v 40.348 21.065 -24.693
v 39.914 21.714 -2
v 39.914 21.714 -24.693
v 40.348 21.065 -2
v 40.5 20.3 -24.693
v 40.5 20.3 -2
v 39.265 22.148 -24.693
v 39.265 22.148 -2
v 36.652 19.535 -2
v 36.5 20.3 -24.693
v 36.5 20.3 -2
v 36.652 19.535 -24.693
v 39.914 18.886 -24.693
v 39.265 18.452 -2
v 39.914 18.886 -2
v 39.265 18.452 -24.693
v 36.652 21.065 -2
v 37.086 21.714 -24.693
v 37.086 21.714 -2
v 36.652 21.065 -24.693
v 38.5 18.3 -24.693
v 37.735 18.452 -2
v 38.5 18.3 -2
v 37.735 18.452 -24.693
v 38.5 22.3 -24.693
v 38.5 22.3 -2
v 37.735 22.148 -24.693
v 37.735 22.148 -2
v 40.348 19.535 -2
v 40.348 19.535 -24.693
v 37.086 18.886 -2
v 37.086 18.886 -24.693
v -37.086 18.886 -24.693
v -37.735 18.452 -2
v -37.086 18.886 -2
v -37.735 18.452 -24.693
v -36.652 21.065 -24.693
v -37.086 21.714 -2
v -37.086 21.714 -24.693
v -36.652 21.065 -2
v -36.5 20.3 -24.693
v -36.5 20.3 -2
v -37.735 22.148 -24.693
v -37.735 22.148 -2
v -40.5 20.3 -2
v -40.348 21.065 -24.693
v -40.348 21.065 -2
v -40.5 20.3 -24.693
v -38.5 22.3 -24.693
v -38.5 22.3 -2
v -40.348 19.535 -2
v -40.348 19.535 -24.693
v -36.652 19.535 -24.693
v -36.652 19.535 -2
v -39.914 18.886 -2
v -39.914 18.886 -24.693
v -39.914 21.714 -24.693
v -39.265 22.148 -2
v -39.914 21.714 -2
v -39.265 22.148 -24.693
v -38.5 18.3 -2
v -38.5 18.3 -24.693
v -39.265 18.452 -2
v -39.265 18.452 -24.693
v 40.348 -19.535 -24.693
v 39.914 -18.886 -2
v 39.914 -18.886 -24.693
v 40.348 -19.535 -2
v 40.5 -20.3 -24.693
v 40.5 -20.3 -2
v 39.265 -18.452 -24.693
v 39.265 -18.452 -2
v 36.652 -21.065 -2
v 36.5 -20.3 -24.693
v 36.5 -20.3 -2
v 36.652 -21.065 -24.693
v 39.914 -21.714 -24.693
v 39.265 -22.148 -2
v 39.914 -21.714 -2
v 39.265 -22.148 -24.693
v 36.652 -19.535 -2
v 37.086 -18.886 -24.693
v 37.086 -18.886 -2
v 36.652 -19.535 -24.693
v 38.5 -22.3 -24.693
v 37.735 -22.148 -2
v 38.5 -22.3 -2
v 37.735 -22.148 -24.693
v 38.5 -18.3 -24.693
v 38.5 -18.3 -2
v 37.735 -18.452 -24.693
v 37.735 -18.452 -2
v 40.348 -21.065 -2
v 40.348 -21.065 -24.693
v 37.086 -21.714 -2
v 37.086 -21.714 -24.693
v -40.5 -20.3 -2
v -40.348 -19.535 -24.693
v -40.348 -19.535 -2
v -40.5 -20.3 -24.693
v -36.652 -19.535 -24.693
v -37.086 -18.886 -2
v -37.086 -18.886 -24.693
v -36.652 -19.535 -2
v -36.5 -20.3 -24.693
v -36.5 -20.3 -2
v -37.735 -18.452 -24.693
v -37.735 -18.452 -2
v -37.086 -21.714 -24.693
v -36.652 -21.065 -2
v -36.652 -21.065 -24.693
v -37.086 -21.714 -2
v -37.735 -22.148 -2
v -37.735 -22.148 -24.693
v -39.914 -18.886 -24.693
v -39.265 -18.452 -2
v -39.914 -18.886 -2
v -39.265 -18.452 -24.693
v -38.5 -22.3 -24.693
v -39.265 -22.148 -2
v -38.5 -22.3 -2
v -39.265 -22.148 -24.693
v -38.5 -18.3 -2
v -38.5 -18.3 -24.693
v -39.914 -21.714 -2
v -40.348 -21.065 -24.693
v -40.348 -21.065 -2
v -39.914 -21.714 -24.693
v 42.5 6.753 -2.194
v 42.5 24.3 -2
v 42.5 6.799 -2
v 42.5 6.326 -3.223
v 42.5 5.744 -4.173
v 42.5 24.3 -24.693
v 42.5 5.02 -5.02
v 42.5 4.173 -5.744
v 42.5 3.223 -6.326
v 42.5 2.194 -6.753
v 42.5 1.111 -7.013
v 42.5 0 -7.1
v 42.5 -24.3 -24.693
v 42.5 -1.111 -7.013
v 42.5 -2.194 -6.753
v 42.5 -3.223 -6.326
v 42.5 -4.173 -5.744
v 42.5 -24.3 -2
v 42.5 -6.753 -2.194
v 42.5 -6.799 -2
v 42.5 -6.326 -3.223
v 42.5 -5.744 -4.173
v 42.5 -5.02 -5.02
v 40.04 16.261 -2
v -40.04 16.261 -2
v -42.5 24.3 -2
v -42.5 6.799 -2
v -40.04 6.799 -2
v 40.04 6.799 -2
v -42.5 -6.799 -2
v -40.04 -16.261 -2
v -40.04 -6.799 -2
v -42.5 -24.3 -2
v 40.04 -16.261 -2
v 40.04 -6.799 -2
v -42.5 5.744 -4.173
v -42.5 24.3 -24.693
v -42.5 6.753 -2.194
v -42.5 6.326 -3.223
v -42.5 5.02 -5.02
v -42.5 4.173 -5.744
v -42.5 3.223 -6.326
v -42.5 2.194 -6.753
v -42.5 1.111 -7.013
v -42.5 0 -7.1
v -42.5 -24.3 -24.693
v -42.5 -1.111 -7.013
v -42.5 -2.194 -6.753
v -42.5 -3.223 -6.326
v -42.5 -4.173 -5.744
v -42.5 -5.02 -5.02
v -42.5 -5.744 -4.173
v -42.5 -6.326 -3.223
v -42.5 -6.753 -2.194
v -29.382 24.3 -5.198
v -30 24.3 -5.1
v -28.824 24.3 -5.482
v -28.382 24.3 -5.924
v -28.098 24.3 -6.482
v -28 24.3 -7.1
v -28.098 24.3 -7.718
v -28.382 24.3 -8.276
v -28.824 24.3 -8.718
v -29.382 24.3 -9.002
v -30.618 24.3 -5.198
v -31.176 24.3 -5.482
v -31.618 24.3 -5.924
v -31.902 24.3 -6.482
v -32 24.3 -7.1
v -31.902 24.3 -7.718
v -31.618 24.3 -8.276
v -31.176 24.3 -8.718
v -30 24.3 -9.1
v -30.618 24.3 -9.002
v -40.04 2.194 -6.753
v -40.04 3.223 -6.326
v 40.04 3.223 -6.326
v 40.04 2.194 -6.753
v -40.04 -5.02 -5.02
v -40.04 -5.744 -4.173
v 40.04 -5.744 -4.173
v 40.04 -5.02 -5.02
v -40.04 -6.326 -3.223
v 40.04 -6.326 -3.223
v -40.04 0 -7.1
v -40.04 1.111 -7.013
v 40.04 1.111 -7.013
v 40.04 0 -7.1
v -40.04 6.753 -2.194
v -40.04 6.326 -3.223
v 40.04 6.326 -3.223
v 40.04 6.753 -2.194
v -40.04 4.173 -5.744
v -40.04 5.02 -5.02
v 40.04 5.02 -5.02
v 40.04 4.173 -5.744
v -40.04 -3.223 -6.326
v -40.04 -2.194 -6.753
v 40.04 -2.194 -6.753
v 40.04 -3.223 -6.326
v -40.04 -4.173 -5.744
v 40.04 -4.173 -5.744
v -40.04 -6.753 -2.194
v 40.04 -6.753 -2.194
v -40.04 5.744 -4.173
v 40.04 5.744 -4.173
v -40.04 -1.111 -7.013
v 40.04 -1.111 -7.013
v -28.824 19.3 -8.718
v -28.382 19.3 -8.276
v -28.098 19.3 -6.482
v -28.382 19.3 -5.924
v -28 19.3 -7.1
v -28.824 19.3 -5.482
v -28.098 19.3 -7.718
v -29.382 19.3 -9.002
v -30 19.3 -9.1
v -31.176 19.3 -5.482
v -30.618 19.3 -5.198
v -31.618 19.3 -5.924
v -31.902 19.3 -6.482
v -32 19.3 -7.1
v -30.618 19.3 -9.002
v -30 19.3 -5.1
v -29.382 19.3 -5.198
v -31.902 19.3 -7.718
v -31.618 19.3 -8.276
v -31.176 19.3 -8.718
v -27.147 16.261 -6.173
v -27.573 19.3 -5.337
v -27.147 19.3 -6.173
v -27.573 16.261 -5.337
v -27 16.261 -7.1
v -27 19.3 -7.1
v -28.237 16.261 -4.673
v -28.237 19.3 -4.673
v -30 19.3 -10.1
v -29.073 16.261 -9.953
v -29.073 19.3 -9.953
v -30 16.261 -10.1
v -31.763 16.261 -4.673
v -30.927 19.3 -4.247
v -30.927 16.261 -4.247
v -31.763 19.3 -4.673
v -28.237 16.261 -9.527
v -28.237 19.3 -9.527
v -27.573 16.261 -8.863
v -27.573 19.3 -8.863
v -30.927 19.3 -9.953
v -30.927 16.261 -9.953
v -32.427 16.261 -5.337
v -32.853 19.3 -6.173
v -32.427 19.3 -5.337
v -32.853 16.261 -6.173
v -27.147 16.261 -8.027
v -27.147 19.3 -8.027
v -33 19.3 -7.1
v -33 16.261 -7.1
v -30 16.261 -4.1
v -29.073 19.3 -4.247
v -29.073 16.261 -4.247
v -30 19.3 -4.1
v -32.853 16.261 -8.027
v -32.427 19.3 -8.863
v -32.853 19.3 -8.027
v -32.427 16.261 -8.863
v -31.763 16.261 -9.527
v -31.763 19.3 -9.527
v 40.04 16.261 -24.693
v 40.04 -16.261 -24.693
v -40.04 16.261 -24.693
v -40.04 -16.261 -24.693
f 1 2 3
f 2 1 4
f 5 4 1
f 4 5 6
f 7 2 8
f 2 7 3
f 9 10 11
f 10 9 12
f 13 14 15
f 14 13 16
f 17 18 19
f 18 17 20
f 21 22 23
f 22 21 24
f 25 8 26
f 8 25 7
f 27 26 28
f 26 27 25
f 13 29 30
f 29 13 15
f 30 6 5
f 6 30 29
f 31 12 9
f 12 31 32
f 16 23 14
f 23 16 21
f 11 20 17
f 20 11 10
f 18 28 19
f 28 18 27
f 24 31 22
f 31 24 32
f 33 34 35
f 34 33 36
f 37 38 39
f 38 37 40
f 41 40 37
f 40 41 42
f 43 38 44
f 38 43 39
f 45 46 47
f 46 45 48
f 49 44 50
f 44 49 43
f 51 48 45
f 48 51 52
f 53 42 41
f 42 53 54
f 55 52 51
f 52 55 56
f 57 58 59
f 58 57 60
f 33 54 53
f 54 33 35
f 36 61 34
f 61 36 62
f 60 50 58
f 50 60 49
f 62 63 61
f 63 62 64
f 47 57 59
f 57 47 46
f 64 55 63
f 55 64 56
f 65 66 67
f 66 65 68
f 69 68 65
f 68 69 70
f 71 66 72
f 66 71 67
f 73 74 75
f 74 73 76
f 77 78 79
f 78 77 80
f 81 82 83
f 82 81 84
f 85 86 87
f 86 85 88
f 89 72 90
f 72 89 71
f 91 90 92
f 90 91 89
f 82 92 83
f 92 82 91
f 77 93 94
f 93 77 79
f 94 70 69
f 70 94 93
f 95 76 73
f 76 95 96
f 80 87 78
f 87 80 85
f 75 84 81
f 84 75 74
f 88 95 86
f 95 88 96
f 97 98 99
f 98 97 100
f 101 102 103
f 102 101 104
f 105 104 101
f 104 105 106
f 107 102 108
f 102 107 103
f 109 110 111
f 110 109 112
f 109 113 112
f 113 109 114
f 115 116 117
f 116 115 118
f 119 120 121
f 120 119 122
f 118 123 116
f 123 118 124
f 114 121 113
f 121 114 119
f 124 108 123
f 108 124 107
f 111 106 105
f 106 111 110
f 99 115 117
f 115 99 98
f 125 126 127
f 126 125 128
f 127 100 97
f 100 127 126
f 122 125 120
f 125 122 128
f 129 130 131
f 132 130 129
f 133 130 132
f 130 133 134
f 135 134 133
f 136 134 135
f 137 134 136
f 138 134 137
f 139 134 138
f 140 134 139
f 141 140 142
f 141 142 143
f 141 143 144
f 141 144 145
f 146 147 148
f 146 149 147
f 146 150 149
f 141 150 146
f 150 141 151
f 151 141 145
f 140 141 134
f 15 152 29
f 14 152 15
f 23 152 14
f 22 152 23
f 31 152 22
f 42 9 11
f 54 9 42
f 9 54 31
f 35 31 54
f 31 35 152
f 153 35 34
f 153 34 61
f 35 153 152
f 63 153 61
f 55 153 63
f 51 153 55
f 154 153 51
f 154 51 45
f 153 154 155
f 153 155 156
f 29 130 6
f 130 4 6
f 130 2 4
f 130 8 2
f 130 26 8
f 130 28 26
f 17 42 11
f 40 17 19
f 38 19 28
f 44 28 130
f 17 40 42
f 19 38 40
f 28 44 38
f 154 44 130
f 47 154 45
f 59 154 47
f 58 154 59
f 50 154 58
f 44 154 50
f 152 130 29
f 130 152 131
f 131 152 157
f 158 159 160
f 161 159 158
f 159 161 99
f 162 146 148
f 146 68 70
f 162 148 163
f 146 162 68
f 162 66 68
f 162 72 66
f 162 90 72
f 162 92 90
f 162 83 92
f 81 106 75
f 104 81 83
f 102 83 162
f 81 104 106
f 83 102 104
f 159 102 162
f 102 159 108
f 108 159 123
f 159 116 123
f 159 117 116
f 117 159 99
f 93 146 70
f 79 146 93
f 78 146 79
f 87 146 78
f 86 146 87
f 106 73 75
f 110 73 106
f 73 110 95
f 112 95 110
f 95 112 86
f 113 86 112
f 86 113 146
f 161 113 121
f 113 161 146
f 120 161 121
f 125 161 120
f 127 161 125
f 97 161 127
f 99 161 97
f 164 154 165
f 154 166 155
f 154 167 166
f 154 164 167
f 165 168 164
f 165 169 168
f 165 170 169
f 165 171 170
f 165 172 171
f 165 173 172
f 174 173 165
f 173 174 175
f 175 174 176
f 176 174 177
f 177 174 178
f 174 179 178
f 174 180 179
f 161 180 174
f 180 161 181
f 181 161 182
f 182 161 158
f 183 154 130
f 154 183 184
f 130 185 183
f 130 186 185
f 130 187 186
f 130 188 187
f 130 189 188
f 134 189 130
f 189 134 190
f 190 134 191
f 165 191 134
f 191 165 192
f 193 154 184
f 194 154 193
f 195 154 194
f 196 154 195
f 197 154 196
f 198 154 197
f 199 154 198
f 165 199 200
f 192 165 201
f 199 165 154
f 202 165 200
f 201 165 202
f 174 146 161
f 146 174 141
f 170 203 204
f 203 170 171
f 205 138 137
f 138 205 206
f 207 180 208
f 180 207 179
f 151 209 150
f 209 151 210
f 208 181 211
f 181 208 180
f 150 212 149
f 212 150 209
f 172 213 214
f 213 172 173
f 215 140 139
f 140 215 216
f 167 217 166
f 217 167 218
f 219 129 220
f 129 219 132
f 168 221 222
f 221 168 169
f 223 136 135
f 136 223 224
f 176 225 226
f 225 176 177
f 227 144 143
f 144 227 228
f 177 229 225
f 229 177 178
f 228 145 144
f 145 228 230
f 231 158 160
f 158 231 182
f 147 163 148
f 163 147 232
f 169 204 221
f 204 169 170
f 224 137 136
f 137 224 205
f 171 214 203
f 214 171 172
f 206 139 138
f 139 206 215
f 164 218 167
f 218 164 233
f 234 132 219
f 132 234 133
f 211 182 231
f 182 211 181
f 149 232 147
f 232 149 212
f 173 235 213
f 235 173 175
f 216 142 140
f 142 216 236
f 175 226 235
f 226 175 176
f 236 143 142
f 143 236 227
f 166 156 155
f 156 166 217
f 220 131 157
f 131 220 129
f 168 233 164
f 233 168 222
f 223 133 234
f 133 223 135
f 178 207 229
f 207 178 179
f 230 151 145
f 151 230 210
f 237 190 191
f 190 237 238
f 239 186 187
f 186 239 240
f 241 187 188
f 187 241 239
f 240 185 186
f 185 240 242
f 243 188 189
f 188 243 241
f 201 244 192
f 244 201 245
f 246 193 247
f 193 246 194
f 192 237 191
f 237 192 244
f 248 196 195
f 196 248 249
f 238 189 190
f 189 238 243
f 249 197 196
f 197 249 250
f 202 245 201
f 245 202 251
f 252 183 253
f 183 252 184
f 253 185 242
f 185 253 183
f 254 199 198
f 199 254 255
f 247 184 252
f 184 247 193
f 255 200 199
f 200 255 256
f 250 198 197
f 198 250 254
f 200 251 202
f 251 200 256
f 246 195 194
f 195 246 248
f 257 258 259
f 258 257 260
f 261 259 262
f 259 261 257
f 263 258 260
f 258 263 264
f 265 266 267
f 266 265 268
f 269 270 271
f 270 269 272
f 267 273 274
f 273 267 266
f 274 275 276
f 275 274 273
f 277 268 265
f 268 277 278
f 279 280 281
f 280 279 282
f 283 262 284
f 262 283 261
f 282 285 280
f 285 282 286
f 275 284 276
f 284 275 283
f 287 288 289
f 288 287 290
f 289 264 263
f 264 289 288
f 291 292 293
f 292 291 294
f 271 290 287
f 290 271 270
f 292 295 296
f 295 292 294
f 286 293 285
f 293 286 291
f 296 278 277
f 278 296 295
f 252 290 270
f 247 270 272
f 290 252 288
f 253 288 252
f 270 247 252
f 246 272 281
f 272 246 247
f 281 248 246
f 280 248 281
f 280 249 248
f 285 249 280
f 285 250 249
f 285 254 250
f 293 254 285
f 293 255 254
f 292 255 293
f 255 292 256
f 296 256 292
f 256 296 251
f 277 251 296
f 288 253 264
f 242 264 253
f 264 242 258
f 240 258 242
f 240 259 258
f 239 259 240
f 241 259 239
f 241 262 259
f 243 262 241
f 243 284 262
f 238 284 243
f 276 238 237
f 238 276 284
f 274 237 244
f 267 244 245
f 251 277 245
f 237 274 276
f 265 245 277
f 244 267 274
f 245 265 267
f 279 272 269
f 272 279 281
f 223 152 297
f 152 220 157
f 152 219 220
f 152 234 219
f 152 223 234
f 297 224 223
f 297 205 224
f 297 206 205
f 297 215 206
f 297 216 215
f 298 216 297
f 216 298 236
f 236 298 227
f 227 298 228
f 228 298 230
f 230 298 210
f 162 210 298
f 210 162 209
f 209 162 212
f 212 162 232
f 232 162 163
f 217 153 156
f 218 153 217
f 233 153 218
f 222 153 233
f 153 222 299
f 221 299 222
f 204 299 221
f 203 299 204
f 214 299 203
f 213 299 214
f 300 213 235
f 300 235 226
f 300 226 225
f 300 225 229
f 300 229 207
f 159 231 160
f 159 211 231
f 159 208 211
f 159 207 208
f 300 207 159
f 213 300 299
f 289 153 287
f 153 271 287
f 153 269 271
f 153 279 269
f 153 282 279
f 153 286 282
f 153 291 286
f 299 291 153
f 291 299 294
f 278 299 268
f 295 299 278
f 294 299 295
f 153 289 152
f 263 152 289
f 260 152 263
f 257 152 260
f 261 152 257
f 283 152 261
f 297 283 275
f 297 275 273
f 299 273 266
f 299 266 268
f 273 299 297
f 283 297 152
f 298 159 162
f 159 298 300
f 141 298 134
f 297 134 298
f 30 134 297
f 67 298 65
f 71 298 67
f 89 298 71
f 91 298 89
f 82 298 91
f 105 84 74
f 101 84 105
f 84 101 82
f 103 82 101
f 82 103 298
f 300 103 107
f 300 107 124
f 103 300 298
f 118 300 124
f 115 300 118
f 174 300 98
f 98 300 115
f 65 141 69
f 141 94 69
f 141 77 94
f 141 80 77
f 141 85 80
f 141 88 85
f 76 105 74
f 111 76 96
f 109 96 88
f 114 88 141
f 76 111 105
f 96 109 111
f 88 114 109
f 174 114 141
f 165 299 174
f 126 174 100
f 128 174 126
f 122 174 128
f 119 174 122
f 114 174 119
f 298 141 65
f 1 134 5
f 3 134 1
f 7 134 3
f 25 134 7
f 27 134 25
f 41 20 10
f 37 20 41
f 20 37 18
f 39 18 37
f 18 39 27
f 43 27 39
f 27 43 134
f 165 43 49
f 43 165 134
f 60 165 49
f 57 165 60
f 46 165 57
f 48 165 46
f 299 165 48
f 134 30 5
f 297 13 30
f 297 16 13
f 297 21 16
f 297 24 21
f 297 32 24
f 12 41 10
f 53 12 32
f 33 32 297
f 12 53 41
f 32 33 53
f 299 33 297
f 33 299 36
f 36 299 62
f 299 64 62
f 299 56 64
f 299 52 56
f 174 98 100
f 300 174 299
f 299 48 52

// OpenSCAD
// file: bolt.scad
include <variables.scad>

bolt();

module bolt() {
	color("Silver")
	union() {
		for (i = [0:2]) {
			rotate([0, 0, 180/3*i])
			cube([boltWidth, boltSegmentWidth, boltHeight],center=true);
		}
	}
}
// file: box.scad
include <variables.scad>
use <bolt.scad>

CylinderPunchedBox(MaxLength, MinWidth, stickRadius-boxSpacing/2+batteryRadius*2+minEdgeWidth, holeRadius, holeRadius*2, true);

module HoledBox(length, width, height, holeRadius, holePadding, NutIndents) {
	difference() {
		cube([length, width, height], center = true);
		
		scale([1,1,1.001])
		union() { // subtractions
			// holes
			translate([
				 (length-holePadding-holeRadius*2)/2, 
				 (width-holePadding-holeRadius*2)/2, 
				-(height)/2])
			cylinder(height+.1, r=holeRadius, $fn=16);
			translate([
				-(length-holePadding-holeRadius*2)/2, 
				 (width-holePadding-holeRadius*2)/2, 
				-(height)/2])
			cylinder(height+.1, r=holeRadius, $fn=16);
			translate([
				 (length-holePadding-holeRadius*2)/2, 
				-(width-holePadding-holeRadius*2)/2, 
				-(height)/2])
			cylinder(height+.1, r=holeRadius, $fn=16);
			translate([
				-(length-holePadding-holeRadius*2)/2, 
				-(width-holePadding-holeRadius*2)/2, 
				-(height)/2])
			cylinder(height+.1, r=holeRadius, $fn=16);
		}

		if(NutIndents) {
			translate([0, 0, -(height-boltHeight+0.001)/2]) {
				translate([(length-holePadding-holeRadius*2)/2, (width-holePadding-holeRadius*2)/2, ])
				scale([1.05, 1.05, 1.1])
				bolt();
				translate([(length-holePadding-holeRadius*2)/2, -(width-holePadding-holeRadius*2)/2, ])
				scale([1.05, 1.05, 1.1])
				bolt();
				translate([-(length-holePadding-holeRadius*2)/2, (width-holePadding-holeRadius*2)/2, ])
				scale([1.05, 1.05, 1.1])
				bolt();
				translate([-(length-holePadding-holeRadius*2)/2, -(width-holePadding-holeRadius*2)/2, ])
				scale([1.05, 1.05, 1.1])
				bolt();
			}
		}
	}
}

module CylinderPunchedBox(length, width, height, holeRadius, holePadding, NutIndents) {
	difference() {
		translate([0, 0, -(height+boxSpacing)/2])
		HoledBox(length, width, height, holeRadius, holePadding, NutIndents);

		scale([1.001, 1, 1])
		rotate([0, 90, 0])
		cylinder((length), r=stickRadius, center=true, $fn=40);
	}
}
// file: pcb.scad
include <variables.scad>

PCB();

module PCB() {
	pinheaderHeight = PCBBoardToBoardHeight-2*PCBHeight;
	pinheaderLength = 38;
	pinheaderWidth = 2.4;
  color(alpha=0.5)
	translate([-(PCBLength-PCBBoardLength), 0, -(PCBBoardToBoardHeight)]) {
		color("Orange")
		translate([(PCBLength-PCBBoardLength)/2, 0, PCBHeight/2])
		cube([PCBBoardLength, PCBWidth, PCBHeight], center=true);
		
		translate([0, 0, PCBHeight]) {
			color("Grey") {
				translate([0, (PCBWidth-pinheaderWidth)/2-PCBNotchWidth, pinheaderHeight/2])
				cube([pinheaderLength, pinheaderWidth, pinheaderHeight], center=true);
				translate([0, -(PCBWidth-pinheaderWidth)/2+PCBNotchWidth, pinheaderHeight/2])
				cube([pinheaderLength, pinheaderWidth, pinheaderHeight], center=true);
			}
			color("Black")
			translate([0, 0, pinheaderHeight+PCBHeight/2])
			cube([55, 32.5, PCBHeight], center=true);

			color("Blue")
			translate([-PCBSensorBoardOverhang, PCBSensorBoardYOffset, 0])
			translate([PCBLength/2, 0, 0])
			translate([PCBSensorBoardLength/2, 0, pinheaderHeight+PCBHeight/2])
			difference() {
				cube([PCBSensorBoardLength, PCBSensorBoardWidth, PCBHeight], center=true);
				translate([PCBSensorBoardLength/2-1-PCBSensorBoardHoleRadius,  (PCBSensorBoardHoleCenterYDistance/2), 0])
				cylinder(10, r=PCBSensorBoardHoleRadius, center=true, $fn=20);
				translate([PCBSensorBoardLength/2-1-PCBSensorBoardHoleRadius, -(PCBSensorBoardHoleCenterYDistance/2), 0])
				cylinder(10, r=PCBSensorBoardHoleRadius, center=true, $fn=20);
			}
			
			color("Grey")
			translate([34, 0, pinheaderHeight/2])
			cube([pinheaderWidth, 20, pinheaderHeight], center=true);
		}
	}
}
// file: pcbBox.scad
include <variables.scad>
use <pcb.scad>
use <box.scad>

pcbBox();

module pcbBox() {
	difference() {
		CylinderPunchedBox(MaxLength, MinWidth, MinHeight, holeRadius, holeRadius*2);
		
		// Hollow out inside box space
		CutoutHeight = stickRadius+(PCBBoardToBoardHeight+PCBComponentsHeight)+PCBToBottomSpacing+PCBToTopSpacing;
		scale([1.001, 1.01, 1])
		translate([0, 0, -(CutoutHeight)/2])
		cube([PCBLength, PCBWidth-PCBNotchWidth*2, CutoutHeight], center=true);
		
		// PCB Notches cutout
		translate([-PCBNotchWidth, 0, -(stickRadius+PCBToTopSpacing+PCBComponentsHeight)])
		PCB();		

		// LED hole
		ledSmallRadius = 2;
		ledLargeRadius = 3;
		ledSmallHoleLength = 5;
		ledLargeHoleLength = ((MinWidth-(PCBWidth-PCBNotchWidth*2))/2)-ledSmallHoleLength;
		color("Green")
		translate([-PCBBoardLength/2+5, MinWidth/2, -(stickRadius)])
		rotate([90, 0, 0]){
			scale([1, 1, 1.01])
			translate([0, 0, -0.01])
			cylinder(ledSmallHoleLength, r=ledSmallRadius, center=false, $fn=20);
			translate([0, 0, ledSmallHoleLength])
			cylinder(ledLargeHoleLength, r=ledLargeRadius, center=false, $fn=20);
		}
	}
}
// file: variables.scad
innerWidth = 38;
innerLength = 80;
innerHeight = 25;
minEdgeWidth = 2.5;
largeEdgeWidth = 6;
holeRadius = 2;
boxSpacing = 4;
stickRadius = 7.1; // fixed by table

sensorScrewHoleRadius = 2.5/2;

// PCBVariables
	PCBWidth = 35.2;
	PCBBoardLength = 70;
	PCBLength = 80;// 70;
	PCBHeight = 1.5;
	PCBBoardToBoardHeight = 13.9; // height of the two layers of pcb and the pinheaders between them
	
	PCBToBottomSpacing = 3; // space for wires on bottom of PCB
	PCBToTopSpacing = 2; // Air gap between pcb components and stick
	PCBNotchWidth = 1.5; // user definable
	PCBComponentsHeight = 17.1-PCBBoardToBoardHeight; // Height of pCB components on top of top layer pcb

	PCBSensorBoardLength = 15.75;
	PCBSensorBoardWidth = 21;
	PCBSensorBoardOverhang = 7.4; // The length of sensor board that overhangs the main print board
	PCBSensorBoardYOffset = -1.5/2;
	PCBSensorBoardHoleRadius = 1.5;
	PCBSensorBoardHoleCenterYDistance = 12.3+PCBSensorBoardHoleRadius*2;

// BatteryBoxVariables
	batteryRadius = 18.3/2;
	batteryLenght = 65;

// Bolts
	boltHeight = 2.4;
	boltWidth = 5.4;
	boltSegmentWidth = 3.2;

// Switch
	SwitchBaseLength = 9.8;
	SwitchBaseWidth = 13.1;
	SwitchBaseHeight = 8;

	SwitchCylinderRadius = 6/2;
	SwitchCylinderLength = 9;
	SwitchLegLength = 4;

// switch_alt
	SwitchAltWidth = 13;
	SwitchAltHeight = 6;
	SwitchAltDepth = 6;
	SwitchPinLength = 4;
	SwitchAltFlipperHeight = 7;


MaxLength = 85; // fixed by table
MinWidth = max(batteryRadius*4, PCBWidth)+2*largeEdgeWidth;
MinHeight = max(batteryRadius*2, PCBToTopSpacing+PCBComponentsHeight+PCBBoardToBoardHeight+PCBToBottomSpacing)+stickRadius+minEdgeWidth;
// main file
include <variables.scad>
use <pcbBox.scad>

pcbTopBox();

module pcbTopBox() {
	cutoffHeight = MinHeight-(PCBBoardToBoardHeight+PCBComponentsHeight);
	difference() {
		pcbBox();
		
		translate([0, 0, -(cutoffHeight)/2])
		translate([0, 0, -(stickRadius+PCBToTopSpacing+PCBComponentsHeight+PCBBoardToBoardHeight-PCBHeight)])
		scale([1.001, 1.001, 1.001])
		cube([MaxLength, MinWidth, cutoffHeight], center=true);
	}
}
